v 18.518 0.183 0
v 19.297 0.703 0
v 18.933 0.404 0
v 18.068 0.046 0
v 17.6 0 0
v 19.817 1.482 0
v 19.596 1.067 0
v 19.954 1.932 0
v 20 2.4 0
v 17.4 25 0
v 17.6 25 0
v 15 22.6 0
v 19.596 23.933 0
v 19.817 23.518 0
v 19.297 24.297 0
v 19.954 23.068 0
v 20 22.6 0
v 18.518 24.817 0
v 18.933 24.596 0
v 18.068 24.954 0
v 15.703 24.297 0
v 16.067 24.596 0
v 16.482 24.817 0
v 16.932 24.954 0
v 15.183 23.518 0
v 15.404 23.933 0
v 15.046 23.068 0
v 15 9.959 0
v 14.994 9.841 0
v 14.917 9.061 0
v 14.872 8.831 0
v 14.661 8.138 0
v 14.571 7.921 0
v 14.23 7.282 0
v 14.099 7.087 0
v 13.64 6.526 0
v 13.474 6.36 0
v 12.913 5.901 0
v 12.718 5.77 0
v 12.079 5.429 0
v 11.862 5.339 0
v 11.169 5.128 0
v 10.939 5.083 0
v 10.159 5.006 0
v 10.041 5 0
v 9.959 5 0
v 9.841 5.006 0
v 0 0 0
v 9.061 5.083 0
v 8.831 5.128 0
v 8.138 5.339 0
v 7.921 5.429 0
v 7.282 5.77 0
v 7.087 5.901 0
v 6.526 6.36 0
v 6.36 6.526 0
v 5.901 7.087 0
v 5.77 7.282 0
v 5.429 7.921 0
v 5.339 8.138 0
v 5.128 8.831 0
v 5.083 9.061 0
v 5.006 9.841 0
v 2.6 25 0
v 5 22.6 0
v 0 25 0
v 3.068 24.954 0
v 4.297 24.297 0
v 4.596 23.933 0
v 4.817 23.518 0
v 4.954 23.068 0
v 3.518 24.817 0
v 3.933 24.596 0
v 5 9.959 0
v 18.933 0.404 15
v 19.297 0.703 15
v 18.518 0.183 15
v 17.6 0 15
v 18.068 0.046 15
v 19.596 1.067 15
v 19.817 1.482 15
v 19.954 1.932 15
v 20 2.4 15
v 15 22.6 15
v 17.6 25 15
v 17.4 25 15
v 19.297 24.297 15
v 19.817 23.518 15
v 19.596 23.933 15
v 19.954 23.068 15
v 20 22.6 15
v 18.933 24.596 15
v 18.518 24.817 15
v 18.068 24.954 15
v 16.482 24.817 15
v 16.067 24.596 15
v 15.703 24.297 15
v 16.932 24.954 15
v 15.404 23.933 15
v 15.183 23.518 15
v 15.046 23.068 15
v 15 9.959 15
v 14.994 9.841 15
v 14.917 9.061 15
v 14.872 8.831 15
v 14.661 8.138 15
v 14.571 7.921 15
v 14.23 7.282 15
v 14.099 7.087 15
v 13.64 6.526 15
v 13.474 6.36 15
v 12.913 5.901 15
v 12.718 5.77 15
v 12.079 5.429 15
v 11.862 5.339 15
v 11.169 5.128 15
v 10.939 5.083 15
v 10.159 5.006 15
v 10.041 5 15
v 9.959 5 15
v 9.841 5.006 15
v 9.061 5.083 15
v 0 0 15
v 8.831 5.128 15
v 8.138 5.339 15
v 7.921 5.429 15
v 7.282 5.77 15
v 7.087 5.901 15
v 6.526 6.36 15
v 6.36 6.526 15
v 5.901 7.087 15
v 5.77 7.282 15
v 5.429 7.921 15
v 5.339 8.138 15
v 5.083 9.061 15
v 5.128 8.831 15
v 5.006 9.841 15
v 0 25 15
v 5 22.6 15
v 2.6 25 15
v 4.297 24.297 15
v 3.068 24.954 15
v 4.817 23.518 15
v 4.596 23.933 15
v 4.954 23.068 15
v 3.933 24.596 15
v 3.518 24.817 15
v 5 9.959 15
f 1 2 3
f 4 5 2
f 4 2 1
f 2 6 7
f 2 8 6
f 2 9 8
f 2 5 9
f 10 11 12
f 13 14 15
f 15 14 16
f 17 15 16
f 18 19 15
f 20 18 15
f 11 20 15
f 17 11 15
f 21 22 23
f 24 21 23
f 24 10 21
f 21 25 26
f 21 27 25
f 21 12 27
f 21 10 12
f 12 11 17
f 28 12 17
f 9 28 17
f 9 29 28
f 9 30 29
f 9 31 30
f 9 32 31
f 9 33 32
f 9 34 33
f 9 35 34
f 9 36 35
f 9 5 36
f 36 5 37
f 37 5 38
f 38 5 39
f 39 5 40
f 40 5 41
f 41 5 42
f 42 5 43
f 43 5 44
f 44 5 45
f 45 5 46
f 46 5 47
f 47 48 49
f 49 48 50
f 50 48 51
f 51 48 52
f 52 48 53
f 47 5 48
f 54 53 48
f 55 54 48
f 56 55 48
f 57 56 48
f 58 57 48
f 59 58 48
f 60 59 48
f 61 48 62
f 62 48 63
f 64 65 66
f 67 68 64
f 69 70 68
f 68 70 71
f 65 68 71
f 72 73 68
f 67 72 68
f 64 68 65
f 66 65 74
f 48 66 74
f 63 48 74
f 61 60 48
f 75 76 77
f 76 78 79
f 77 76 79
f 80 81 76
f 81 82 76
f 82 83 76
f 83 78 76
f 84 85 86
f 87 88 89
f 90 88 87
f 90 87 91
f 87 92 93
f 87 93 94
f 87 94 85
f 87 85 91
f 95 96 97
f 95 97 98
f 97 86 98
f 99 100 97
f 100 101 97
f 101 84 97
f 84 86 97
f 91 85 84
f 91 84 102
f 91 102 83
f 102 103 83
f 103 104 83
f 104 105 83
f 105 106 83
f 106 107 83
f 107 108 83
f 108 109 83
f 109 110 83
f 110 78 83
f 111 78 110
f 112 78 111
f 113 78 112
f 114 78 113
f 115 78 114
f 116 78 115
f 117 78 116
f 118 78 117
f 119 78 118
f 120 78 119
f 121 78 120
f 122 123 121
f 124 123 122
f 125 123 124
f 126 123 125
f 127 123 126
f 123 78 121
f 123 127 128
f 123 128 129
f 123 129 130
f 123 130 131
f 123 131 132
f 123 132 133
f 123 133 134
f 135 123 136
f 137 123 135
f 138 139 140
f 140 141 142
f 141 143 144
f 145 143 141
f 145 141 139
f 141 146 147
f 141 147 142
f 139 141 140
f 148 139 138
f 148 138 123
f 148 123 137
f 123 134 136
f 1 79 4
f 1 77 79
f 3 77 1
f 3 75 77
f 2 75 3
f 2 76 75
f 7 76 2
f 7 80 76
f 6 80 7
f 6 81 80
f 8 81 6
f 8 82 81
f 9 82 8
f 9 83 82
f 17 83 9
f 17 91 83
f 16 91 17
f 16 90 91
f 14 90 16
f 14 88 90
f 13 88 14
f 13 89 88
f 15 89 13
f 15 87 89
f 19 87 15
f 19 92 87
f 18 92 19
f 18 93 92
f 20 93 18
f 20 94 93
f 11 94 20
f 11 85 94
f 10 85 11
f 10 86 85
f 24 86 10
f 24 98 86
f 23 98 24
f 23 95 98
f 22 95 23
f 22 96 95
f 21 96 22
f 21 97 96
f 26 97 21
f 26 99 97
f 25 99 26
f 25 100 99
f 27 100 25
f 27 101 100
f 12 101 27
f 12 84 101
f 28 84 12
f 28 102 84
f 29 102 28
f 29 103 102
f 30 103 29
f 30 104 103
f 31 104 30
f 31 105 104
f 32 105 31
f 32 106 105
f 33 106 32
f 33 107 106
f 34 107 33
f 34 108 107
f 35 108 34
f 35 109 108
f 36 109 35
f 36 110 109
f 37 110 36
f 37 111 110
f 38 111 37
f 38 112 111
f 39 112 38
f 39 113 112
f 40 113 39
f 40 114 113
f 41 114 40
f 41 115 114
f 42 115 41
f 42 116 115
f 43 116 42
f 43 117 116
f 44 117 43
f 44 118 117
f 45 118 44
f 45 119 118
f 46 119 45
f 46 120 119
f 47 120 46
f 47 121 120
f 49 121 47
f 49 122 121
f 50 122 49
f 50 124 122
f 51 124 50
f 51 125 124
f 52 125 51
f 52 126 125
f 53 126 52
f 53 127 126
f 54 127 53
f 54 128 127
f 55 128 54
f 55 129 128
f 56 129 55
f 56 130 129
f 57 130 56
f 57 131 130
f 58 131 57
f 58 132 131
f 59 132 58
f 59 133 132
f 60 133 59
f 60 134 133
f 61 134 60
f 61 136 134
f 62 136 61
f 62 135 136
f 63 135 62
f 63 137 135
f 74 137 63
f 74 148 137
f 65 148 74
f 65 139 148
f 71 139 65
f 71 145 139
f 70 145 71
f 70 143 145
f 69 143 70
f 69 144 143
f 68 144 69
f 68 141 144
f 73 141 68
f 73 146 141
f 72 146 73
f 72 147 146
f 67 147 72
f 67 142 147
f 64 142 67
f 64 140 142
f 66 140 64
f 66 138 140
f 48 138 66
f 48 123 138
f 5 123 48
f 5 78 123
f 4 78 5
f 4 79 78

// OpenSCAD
/*
___      __
|  \    /  \
|  |    |  |
|  |    |  |
|  |    |  |
|  |____|  |
|_________/

*/

plant_t = 10;
h = 20;
extrude = 15;

t = 5;
r = t / 2 - .1;
// r = 2.4;

max_x = t + plant_t + t;
may_y = h + t;

$fn = 32;

linear_extrude(height=extrude)
  difference() {
    offset(r) offset(-r)
        difference() {
          translate([-r, 0])
            square(size=[max_x + r, may_y]);
          translate([t, t])
            offset((plant_t/2-.1)) offset(-(plant_t/2-.1))
                square(size=[plant_t, may_y + r]);
        }
    translate([-r, 0])
      square(size=[r, may_y]);
  }
